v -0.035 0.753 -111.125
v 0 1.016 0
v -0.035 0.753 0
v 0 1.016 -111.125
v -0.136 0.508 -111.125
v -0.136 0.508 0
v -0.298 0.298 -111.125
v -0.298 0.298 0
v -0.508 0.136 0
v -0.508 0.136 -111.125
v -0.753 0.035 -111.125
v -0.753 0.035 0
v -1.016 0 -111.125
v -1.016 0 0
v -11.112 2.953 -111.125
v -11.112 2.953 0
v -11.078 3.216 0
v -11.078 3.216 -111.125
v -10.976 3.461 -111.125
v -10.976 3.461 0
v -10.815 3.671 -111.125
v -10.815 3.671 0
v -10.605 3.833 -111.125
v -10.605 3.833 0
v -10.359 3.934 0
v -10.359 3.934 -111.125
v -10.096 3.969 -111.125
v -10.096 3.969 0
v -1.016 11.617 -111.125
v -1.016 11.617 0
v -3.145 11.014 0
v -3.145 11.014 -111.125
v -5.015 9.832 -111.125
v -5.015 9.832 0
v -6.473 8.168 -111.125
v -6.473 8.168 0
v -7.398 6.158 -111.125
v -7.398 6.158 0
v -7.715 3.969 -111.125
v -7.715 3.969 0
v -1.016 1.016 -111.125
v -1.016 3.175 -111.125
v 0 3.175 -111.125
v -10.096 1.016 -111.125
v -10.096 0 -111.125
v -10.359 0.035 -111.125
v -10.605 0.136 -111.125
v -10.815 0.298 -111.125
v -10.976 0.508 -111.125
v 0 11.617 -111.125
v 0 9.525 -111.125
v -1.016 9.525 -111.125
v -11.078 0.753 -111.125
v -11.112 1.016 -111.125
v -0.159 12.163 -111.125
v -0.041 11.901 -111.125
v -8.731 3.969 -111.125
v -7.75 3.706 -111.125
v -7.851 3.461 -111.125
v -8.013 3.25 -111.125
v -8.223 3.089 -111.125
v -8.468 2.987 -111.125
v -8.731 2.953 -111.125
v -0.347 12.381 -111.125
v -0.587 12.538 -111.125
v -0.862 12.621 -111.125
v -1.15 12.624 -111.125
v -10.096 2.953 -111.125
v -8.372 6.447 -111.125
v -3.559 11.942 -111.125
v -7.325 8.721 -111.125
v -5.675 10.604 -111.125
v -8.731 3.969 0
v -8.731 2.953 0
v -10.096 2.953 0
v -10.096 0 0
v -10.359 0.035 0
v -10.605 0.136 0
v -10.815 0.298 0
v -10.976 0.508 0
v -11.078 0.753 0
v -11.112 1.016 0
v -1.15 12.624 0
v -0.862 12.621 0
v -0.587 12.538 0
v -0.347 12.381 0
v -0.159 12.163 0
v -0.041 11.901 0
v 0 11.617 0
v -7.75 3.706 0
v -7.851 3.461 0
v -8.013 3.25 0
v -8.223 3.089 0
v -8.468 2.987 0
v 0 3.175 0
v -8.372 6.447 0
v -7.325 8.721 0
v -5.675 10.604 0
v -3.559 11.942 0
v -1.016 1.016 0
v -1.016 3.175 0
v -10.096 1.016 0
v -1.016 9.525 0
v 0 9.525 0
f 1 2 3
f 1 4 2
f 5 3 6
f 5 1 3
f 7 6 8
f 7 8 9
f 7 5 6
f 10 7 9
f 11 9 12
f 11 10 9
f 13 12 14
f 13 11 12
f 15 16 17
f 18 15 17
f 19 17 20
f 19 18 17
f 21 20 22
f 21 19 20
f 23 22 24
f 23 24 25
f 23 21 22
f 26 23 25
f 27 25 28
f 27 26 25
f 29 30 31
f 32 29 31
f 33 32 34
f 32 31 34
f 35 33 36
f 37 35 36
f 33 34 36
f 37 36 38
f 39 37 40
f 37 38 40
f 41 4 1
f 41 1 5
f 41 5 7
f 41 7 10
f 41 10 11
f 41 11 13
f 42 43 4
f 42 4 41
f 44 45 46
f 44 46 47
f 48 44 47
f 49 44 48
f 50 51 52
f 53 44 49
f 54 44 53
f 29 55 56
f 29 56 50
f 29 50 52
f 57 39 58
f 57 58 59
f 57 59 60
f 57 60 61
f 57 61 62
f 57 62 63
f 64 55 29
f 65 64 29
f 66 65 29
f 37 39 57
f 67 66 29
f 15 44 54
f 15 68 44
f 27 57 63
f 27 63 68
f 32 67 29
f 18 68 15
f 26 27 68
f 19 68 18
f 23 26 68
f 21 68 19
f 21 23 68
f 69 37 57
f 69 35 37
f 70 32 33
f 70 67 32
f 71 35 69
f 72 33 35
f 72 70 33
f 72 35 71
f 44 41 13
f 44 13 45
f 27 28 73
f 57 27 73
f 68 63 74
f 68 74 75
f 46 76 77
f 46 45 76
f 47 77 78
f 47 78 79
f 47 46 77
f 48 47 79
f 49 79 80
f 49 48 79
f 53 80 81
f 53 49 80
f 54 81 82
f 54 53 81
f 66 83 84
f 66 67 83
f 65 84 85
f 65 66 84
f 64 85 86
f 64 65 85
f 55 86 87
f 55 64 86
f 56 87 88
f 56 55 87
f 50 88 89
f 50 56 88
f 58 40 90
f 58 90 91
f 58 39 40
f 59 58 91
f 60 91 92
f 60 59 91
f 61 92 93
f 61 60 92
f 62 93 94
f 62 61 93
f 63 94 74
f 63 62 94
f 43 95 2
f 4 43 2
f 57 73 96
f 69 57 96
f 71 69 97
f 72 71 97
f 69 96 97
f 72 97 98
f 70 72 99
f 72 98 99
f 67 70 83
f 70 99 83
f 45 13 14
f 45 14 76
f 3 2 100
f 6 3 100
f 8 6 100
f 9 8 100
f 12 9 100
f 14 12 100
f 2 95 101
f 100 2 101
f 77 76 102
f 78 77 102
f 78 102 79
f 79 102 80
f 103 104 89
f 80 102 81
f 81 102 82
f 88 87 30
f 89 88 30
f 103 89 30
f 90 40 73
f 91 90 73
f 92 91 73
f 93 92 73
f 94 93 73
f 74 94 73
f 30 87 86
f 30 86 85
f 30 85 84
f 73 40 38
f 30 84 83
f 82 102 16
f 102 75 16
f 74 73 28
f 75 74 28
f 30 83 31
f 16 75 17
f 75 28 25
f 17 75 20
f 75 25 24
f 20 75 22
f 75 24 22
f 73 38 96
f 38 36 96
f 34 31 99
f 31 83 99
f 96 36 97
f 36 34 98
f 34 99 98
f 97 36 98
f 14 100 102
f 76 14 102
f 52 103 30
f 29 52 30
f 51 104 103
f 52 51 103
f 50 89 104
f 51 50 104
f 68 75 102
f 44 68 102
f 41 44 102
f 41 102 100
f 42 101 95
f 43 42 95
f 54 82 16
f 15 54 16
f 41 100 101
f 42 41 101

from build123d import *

# Parameters (mm, degrees)
EXTRUDE_THIN1_DEPTH = 111.125
FILLET1_R           = 1.016


with BuildPart() as part:
    # Sketch1 → Extrude-Thin1 (new body)
    with BuildSketch(Plane.XY):
        with BuildLine():
            Line((0, 3.175), (0, 0))
            Line((0, 0), (-11.1125, 0))
            Line((-11.1125, 0), (-11.1125, 3.96875))
            Line((-11.1125, 3.96875), (-8.73125, 3.96875))
            ThreePointArc((-8.73125, 3.96875), (-6.173926083, 10.142676083), (0, 12.7))
            Line((0, 12.7), (0, 9.525))
            Line((0, 9.525), (-1.016, 9.525))
            Line((-1.016, 9.525), (-1.016, 11.616810314))
            ThreePointArc((-1.016, 11.616810314), (-6.1264158, 8.658324821), (-7.648060314, 2.95275))
            Line((-7.648060314, 2.95275), (-10.0965, 2.95275))
            Line((-10.0965, 2.95275), (-10.0965, 1.016))
            Line((-10.0965, 1.016), (-1.016, 1.016))
            Line((-1.016, 1.016), (-1.016, 3.175))
            Line((-1.016, 3.175), (0, 3.175))
        make_face()
    extrude(amount=-EXTRUDE_THIN1_DEPTH)

    # Fillet1
    fillet1_edges = [part.edges().sort_by_distance(p)[0] for p in [
        (-7.648060314, 2.95275, -55.5625),
        (0, 0, -55.5625),
        (-11.1125, 0, -55.5625),
        (-11.1125, 3.96875, -55.5625),
        (0, 12.7, -55.5625),
    ]]
    fillet(fillet1_edges, radius=FILLET1_R)


solid = part.part
